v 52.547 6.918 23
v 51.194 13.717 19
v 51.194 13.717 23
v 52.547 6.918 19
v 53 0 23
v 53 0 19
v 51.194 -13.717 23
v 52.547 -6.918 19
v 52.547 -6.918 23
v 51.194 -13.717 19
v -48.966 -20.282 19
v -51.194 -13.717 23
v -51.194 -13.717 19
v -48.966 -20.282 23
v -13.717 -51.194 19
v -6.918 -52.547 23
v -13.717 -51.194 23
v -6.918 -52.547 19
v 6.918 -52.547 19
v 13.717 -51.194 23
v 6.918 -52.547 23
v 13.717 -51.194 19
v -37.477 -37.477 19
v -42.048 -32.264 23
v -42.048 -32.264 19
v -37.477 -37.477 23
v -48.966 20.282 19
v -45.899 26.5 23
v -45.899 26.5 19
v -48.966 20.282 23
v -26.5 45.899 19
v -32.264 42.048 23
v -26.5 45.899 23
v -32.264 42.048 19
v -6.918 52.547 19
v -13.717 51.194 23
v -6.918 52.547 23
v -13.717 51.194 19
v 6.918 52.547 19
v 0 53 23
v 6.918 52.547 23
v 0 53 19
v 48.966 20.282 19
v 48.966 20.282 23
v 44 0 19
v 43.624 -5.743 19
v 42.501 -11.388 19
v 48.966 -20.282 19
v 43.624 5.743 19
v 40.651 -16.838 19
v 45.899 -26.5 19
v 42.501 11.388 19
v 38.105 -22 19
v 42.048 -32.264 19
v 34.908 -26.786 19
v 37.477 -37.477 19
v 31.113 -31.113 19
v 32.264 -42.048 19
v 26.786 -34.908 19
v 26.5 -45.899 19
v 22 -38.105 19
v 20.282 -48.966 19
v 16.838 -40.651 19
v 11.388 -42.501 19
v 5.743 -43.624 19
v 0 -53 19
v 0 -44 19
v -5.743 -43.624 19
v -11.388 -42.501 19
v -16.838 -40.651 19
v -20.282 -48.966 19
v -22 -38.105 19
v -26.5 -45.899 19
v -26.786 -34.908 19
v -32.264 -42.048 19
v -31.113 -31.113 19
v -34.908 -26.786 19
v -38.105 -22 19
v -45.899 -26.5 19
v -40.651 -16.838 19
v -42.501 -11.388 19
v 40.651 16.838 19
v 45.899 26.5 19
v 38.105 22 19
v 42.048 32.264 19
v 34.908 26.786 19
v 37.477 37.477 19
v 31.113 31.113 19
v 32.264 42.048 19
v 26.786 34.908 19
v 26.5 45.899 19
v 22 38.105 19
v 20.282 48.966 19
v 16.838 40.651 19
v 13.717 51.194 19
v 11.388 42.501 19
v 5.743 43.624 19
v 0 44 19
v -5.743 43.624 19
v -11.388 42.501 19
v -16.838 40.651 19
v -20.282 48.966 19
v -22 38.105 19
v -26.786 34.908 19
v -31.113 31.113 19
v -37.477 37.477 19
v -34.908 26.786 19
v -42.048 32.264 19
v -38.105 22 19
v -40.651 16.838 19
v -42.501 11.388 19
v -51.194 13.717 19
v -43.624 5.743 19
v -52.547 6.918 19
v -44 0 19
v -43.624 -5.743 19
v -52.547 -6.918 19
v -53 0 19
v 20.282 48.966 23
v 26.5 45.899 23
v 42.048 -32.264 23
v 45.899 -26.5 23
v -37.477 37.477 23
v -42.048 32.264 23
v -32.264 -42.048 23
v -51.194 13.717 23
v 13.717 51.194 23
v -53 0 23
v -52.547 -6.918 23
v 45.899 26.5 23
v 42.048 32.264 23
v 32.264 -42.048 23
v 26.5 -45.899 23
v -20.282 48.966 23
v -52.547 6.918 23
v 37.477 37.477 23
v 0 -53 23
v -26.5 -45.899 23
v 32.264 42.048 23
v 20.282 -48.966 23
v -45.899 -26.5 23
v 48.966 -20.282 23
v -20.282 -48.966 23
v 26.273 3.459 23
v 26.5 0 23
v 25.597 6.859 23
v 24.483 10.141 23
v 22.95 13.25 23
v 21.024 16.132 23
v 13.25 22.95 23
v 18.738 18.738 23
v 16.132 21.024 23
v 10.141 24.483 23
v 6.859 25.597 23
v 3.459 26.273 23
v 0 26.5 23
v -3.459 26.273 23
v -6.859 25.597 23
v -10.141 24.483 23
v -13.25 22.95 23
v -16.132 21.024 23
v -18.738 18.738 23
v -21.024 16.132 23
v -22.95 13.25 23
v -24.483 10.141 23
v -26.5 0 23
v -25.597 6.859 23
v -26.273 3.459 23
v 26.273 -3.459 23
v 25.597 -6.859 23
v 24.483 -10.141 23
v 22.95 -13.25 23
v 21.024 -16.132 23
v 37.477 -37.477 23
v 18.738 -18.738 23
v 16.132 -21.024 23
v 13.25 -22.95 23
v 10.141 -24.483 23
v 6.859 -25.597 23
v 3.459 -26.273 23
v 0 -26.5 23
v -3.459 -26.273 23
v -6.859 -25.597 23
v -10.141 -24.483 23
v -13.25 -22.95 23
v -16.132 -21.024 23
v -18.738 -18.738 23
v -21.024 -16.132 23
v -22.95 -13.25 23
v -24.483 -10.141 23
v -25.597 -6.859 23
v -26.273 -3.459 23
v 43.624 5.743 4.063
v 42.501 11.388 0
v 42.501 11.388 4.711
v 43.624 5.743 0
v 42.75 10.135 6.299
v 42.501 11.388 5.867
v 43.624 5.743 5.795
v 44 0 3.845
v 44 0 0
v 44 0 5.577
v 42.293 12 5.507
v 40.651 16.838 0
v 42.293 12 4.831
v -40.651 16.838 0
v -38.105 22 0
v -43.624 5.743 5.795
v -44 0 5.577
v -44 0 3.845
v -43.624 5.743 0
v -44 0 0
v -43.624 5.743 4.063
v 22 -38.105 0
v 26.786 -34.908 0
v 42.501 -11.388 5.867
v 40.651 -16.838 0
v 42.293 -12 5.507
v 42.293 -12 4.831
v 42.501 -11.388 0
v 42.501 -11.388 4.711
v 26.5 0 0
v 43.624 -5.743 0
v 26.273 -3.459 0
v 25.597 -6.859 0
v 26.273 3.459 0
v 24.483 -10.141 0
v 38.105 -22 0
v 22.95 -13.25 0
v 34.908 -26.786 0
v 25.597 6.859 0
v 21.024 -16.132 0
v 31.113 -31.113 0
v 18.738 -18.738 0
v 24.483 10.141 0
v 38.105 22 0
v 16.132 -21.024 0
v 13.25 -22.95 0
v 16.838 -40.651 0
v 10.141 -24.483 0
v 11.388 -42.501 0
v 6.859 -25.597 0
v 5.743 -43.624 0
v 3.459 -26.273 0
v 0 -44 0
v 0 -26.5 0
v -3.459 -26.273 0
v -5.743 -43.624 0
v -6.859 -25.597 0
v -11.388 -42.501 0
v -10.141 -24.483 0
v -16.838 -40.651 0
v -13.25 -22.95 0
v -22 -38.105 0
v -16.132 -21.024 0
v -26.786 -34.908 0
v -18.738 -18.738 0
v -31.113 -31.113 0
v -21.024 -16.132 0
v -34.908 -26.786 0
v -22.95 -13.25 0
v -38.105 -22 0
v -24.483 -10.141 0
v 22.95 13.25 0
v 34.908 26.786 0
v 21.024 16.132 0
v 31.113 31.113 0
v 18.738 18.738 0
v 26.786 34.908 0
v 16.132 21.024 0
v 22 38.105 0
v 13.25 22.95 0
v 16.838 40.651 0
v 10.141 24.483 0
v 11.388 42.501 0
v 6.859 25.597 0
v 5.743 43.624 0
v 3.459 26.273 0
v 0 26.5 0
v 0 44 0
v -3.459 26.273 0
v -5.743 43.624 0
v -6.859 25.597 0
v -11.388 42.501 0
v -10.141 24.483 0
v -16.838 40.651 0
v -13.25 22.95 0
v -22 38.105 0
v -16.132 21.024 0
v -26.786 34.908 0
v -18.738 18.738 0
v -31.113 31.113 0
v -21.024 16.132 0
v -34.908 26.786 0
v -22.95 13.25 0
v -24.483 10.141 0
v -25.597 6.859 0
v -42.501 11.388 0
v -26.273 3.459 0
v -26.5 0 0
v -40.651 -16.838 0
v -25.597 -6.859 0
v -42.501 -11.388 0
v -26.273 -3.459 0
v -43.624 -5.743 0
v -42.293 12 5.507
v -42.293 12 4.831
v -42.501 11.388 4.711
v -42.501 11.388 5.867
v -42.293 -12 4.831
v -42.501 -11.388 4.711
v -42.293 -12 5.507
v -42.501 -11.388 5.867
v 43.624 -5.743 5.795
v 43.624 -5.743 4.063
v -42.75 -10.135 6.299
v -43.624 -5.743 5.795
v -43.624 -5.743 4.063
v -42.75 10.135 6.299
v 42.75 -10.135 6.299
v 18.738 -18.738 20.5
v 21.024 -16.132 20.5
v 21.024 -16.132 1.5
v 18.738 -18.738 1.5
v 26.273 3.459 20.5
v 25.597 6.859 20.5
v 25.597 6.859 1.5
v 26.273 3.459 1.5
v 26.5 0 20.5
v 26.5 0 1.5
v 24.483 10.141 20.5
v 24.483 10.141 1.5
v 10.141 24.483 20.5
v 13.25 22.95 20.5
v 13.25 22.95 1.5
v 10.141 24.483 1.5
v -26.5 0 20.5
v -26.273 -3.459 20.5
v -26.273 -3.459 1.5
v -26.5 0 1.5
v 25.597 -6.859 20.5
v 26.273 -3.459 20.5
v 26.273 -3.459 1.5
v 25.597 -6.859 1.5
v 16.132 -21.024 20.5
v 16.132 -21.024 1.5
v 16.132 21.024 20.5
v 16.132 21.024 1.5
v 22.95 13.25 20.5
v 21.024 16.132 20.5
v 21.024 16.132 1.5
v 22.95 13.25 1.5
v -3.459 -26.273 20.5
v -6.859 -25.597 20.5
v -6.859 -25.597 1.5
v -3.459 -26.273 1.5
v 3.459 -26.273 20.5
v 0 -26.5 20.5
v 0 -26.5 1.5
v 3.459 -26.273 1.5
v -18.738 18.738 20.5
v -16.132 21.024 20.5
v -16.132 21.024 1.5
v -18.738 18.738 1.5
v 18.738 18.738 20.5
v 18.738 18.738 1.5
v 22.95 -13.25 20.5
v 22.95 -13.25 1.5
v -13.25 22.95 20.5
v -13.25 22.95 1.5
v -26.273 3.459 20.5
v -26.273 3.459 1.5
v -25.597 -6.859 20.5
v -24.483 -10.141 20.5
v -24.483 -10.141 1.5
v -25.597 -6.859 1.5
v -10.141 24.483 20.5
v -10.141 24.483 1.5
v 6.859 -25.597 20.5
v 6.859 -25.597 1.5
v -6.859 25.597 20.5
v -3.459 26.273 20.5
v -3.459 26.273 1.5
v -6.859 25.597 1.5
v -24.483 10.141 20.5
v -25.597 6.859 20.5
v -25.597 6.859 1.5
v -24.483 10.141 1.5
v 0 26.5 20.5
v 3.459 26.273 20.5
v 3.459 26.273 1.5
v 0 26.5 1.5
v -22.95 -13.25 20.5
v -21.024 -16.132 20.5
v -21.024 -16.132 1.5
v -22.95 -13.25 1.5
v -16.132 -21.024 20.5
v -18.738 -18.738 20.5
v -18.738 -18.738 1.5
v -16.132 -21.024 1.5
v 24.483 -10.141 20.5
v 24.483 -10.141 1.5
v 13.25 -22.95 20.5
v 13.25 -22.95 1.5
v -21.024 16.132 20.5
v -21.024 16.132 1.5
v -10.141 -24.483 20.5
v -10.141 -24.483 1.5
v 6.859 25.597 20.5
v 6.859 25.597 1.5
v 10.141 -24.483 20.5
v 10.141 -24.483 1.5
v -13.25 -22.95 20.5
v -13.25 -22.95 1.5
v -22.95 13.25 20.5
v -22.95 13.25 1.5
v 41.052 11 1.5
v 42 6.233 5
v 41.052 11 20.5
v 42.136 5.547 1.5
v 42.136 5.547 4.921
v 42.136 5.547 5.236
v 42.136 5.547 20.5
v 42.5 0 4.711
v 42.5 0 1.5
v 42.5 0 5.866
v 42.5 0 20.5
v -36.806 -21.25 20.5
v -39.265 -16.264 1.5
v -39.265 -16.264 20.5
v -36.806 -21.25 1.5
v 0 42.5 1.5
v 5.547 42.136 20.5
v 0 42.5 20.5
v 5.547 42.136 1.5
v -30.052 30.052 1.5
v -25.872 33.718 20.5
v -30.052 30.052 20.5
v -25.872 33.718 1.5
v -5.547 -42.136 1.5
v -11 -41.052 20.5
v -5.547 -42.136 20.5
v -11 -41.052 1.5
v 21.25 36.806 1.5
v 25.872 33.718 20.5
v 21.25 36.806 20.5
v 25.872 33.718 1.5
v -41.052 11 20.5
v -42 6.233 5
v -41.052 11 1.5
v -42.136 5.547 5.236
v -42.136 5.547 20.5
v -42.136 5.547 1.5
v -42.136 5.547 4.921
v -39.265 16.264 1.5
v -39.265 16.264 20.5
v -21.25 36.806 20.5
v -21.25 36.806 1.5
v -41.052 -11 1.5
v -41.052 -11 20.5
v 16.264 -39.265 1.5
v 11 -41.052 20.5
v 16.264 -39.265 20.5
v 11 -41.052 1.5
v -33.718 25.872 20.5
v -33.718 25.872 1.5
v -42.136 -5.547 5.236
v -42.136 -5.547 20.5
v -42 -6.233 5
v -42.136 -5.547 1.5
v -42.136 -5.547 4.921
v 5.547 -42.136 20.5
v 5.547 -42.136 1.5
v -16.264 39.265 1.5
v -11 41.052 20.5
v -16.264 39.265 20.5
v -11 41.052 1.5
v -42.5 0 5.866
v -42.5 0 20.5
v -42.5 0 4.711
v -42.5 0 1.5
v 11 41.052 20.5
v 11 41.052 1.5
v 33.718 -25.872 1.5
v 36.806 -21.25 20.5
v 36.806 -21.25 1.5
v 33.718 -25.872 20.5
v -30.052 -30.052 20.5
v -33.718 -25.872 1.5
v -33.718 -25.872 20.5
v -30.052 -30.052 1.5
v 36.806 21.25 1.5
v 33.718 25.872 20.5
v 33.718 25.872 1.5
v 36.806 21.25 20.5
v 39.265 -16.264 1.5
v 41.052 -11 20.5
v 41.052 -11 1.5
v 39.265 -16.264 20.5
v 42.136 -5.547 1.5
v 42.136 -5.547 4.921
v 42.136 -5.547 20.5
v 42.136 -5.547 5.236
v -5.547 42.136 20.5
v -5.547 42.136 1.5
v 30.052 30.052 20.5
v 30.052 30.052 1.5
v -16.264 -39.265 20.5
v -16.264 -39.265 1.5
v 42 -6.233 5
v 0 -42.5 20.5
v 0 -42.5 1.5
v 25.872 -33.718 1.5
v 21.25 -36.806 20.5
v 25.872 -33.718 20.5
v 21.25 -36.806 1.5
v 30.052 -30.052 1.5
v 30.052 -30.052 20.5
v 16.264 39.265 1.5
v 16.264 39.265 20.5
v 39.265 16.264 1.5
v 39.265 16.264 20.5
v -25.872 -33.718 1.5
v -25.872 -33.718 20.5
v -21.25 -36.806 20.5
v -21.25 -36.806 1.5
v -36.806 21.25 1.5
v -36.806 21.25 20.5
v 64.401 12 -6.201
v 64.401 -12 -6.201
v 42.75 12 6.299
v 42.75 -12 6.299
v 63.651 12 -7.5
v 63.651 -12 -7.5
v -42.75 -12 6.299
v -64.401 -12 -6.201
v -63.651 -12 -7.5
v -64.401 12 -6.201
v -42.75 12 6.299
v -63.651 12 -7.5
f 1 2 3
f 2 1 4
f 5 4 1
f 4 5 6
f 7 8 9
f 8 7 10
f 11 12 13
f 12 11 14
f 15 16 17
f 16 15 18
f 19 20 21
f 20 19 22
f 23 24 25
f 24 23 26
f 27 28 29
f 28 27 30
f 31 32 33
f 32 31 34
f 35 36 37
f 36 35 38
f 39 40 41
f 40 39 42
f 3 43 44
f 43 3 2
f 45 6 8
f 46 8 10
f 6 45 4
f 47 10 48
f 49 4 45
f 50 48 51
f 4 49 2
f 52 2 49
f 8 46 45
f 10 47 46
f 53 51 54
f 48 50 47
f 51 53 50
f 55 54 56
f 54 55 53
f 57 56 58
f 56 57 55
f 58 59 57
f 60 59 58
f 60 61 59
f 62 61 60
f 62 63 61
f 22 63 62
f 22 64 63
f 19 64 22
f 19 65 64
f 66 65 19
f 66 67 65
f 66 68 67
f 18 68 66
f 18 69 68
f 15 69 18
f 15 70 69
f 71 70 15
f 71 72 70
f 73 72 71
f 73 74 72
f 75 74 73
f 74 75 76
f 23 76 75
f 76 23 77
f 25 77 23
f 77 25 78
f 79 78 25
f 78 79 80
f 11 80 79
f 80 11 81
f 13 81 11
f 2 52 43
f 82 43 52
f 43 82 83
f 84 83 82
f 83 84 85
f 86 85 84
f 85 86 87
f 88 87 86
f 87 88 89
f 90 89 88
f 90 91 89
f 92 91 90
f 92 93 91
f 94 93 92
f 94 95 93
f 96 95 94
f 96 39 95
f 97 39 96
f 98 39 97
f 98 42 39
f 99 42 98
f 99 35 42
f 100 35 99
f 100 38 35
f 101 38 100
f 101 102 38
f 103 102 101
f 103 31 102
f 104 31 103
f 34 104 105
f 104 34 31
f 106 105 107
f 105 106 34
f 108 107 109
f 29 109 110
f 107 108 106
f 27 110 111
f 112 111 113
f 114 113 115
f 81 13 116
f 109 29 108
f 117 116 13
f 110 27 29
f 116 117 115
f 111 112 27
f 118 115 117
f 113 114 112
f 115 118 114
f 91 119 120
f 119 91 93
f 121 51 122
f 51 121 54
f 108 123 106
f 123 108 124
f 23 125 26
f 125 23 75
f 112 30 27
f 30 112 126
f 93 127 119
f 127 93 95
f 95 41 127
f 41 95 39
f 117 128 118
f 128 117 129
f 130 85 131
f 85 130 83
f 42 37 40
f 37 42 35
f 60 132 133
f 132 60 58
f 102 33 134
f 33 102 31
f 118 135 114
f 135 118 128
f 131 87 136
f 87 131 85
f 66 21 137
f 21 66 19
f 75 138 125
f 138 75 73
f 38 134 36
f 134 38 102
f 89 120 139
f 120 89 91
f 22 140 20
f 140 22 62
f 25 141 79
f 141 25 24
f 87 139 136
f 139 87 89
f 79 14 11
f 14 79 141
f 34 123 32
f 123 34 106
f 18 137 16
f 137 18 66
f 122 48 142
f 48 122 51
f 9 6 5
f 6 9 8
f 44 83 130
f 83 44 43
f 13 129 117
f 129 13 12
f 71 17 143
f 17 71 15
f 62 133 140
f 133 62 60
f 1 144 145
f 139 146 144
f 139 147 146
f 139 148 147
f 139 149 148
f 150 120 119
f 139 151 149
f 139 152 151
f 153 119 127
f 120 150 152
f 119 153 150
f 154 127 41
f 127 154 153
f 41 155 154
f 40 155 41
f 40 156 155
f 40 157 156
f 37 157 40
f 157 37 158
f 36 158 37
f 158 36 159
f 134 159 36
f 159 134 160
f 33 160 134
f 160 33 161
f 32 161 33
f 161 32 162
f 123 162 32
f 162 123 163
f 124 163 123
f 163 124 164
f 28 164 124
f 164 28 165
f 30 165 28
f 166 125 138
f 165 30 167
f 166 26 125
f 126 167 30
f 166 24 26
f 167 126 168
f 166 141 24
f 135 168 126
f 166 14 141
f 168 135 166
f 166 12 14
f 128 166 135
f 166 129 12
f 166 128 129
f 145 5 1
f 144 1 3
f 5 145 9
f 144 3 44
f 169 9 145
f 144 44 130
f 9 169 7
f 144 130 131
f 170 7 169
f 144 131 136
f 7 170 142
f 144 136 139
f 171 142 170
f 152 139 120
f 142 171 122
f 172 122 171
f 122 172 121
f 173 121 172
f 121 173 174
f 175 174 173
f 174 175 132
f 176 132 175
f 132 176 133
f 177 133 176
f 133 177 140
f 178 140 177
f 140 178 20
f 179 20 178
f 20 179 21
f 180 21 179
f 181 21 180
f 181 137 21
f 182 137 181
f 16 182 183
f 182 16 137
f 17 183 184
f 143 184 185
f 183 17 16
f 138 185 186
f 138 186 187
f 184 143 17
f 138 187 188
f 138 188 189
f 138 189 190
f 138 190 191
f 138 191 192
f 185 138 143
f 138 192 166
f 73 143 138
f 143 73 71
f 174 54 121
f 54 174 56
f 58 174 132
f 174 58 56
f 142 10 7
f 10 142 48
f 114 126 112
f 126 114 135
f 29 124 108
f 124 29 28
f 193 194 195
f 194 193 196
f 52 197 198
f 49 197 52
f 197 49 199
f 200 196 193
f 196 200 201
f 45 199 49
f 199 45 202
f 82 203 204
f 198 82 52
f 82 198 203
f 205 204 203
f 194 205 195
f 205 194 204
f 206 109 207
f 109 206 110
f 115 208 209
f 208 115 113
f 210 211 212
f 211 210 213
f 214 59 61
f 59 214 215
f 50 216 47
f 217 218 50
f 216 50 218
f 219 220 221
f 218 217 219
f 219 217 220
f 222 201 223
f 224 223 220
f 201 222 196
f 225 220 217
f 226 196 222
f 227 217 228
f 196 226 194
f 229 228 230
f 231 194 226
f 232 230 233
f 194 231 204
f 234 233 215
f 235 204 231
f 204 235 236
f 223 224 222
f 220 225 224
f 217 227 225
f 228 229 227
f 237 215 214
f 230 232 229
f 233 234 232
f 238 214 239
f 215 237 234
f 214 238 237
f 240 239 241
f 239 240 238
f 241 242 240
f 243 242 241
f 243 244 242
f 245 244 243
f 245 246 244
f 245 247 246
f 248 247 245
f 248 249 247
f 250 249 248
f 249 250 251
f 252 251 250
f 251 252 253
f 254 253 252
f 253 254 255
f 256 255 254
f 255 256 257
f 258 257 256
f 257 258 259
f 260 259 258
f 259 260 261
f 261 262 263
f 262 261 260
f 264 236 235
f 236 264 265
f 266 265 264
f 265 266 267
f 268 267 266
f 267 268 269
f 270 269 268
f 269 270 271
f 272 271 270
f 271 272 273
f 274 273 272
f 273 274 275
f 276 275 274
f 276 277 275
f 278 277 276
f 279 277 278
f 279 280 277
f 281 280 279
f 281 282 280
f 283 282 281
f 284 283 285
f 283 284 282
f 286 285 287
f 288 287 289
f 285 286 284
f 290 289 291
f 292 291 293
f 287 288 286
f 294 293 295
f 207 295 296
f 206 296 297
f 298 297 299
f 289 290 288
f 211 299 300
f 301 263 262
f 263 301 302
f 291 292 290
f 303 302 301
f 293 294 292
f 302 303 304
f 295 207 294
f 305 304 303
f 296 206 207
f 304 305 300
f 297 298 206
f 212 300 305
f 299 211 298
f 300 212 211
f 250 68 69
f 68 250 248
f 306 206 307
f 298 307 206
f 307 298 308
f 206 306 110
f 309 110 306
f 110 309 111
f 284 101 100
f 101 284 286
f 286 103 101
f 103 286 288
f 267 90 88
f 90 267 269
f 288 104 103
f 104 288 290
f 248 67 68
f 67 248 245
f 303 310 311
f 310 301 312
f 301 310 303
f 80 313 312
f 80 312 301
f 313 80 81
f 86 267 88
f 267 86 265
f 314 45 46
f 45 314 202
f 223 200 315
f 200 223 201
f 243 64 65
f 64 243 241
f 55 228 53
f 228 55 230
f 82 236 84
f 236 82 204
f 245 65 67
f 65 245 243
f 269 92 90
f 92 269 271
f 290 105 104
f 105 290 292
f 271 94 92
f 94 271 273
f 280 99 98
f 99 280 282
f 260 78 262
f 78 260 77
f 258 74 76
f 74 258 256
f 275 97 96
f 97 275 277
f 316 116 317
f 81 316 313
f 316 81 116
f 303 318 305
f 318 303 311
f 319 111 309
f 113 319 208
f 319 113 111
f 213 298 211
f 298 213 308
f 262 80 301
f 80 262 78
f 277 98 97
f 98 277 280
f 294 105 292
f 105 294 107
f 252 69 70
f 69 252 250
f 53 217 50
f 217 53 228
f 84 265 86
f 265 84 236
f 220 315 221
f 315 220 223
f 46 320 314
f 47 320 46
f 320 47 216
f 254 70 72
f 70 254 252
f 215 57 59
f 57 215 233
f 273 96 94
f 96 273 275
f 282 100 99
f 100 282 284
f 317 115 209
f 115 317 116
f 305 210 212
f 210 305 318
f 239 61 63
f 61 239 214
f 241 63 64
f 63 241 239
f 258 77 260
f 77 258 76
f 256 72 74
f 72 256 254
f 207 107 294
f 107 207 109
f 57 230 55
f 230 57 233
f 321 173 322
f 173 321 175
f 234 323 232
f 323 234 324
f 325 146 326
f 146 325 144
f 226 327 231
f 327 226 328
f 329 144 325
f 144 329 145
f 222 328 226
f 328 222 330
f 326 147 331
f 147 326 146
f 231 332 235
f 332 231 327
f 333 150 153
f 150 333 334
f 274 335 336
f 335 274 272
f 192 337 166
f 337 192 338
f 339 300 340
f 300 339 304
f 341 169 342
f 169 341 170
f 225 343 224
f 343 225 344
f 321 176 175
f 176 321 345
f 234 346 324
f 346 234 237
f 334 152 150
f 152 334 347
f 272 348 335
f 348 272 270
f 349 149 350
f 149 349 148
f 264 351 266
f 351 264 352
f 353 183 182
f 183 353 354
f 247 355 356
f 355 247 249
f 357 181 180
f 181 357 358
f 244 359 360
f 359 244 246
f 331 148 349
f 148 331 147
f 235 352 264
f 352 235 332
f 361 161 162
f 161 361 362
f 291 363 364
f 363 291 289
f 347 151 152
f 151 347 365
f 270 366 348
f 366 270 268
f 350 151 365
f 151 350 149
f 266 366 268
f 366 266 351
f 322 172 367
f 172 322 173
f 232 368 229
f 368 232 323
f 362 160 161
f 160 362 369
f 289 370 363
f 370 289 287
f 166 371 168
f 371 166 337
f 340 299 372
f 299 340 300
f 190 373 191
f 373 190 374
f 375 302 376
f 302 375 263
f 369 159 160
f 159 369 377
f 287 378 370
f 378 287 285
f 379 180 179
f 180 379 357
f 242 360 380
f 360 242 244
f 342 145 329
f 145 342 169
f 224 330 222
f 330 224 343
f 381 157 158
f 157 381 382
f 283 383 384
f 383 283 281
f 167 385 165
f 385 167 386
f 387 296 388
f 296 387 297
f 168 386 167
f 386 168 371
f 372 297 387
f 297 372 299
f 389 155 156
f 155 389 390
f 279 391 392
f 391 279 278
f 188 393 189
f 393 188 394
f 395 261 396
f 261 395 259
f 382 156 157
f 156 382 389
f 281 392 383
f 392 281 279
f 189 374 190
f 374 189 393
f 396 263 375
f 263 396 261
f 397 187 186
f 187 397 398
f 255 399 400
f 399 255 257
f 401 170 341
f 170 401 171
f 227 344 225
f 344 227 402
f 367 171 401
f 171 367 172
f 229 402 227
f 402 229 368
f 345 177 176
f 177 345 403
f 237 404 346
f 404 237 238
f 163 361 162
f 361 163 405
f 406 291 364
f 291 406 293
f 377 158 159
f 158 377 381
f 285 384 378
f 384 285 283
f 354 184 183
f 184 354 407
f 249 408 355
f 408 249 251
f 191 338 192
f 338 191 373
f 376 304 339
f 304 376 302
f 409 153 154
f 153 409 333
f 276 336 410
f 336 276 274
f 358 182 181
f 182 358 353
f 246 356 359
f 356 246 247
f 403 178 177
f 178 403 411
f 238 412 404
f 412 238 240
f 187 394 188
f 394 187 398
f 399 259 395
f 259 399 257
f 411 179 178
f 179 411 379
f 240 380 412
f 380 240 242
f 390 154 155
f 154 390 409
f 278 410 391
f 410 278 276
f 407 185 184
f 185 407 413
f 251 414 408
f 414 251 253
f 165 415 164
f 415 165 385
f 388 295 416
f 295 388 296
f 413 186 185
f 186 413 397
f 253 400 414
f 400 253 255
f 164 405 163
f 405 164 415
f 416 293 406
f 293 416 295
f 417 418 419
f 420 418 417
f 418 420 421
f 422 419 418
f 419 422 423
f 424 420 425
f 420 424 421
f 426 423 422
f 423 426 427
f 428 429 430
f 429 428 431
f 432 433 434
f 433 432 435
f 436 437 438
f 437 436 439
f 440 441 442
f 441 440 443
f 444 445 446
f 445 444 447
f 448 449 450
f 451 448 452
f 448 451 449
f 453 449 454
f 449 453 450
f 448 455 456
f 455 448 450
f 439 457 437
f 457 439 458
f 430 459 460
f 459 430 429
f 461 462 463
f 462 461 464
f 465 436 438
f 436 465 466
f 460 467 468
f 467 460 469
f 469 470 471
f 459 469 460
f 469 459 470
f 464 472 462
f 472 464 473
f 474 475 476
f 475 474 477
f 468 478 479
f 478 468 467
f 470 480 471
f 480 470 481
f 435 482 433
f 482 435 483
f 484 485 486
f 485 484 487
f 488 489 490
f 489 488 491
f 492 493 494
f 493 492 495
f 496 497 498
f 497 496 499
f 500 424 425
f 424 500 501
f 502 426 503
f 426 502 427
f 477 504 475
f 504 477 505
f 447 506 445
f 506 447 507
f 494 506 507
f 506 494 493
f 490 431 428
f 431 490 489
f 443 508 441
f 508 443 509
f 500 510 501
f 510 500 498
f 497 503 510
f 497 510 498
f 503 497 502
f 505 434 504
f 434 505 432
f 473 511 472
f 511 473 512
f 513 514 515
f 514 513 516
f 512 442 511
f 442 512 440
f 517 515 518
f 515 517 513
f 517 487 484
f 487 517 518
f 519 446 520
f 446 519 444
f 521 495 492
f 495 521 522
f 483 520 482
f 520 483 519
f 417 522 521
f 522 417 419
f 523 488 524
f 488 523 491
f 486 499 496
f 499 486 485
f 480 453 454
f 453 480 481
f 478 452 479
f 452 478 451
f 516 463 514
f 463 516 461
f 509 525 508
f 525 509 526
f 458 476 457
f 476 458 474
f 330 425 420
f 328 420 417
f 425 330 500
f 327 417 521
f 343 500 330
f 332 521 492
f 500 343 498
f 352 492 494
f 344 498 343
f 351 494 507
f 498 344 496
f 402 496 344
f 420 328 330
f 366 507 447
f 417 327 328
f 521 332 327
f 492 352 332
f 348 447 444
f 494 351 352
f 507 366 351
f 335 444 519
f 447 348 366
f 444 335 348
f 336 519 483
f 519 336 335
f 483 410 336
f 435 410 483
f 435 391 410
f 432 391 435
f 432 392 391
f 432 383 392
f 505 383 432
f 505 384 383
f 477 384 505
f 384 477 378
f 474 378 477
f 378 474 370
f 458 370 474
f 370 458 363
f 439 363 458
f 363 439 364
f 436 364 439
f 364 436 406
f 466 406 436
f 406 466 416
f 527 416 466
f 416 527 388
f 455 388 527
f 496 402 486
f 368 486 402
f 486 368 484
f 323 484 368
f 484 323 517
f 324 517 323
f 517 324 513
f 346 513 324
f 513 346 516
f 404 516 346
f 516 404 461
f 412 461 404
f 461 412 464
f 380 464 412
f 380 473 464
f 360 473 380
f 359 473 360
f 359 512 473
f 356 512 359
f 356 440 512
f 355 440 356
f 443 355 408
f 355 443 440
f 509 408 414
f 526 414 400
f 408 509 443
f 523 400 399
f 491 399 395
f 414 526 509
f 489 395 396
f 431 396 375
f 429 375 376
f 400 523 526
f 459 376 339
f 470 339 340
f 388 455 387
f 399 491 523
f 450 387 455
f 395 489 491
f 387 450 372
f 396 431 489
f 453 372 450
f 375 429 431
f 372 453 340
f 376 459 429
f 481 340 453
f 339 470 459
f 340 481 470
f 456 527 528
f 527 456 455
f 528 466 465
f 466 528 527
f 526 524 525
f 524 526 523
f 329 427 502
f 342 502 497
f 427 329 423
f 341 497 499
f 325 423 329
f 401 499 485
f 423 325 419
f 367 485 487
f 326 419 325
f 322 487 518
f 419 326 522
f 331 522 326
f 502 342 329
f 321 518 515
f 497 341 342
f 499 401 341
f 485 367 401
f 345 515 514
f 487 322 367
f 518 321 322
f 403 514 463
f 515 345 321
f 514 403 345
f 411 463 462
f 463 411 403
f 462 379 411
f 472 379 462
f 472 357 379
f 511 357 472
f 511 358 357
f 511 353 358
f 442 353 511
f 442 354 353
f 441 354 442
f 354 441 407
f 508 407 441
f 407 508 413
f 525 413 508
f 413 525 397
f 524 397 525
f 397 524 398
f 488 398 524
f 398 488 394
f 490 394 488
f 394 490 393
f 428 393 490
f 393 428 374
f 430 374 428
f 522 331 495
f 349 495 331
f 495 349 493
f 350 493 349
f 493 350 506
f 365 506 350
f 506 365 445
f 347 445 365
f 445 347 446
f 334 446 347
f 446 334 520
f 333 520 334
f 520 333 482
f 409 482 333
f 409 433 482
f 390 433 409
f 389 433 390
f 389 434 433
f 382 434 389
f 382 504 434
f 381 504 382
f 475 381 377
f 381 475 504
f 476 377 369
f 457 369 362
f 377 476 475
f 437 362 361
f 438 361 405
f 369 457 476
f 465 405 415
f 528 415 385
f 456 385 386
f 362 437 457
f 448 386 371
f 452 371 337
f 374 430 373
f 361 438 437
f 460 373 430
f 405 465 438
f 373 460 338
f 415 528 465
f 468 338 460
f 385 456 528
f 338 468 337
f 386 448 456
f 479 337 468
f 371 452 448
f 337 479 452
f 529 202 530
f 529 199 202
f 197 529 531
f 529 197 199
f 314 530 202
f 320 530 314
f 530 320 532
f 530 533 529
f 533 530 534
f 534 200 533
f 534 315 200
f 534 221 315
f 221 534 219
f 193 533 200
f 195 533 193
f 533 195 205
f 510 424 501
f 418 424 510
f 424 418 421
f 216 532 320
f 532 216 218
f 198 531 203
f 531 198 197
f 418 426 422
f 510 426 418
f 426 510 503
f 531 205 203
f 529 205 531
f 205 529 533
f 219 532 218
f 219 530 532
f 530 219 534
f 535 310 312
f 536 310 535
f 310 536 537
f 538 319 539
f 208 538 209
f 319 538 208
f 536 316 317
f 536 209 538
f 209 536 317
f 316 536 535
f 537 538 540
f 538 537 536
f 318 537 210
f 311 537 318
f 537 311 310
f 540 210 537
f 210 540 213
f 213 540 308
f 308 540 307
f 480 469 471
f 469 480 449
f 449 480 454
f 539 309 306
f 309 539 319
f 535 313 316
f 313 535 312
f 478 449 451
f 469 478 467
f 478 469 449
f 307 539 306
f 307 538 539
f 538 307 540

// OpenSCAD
/*
 * GX53 Светильник - упрощённая модель
 * Для визуализации
 */

$fn = 48;

// Размеры
outer_d = 106;
inner_d = 53;
cutout_d = 90;
h_flange = 4;
h_body = 19;

// Корпус
difference() {
    union() {
        // Фланец
        translate([0,0,h_body])
        cylinder(h=h_flange, d=outer_d);
        
        // Тело
        cylinder(h=h_body, d=cutout_d-2);
    }
    
    // Отверстие
    translate([0,0,-1])
    cylinder(h=h_body+h_flange+2, d=inner_d);
    
    // Полость
    translate([0,0,1.5])
    cylinder(h=h_body, d=cutout_d-5);
}

// Пружины (упрощённо)
for(a=[0,180]) {
    rotate([0,0,a])
    translate([cutout_d/2-3, -12, 5])
    rotate([0,30,0])
    cube([25, 24, 1.5]);
}
